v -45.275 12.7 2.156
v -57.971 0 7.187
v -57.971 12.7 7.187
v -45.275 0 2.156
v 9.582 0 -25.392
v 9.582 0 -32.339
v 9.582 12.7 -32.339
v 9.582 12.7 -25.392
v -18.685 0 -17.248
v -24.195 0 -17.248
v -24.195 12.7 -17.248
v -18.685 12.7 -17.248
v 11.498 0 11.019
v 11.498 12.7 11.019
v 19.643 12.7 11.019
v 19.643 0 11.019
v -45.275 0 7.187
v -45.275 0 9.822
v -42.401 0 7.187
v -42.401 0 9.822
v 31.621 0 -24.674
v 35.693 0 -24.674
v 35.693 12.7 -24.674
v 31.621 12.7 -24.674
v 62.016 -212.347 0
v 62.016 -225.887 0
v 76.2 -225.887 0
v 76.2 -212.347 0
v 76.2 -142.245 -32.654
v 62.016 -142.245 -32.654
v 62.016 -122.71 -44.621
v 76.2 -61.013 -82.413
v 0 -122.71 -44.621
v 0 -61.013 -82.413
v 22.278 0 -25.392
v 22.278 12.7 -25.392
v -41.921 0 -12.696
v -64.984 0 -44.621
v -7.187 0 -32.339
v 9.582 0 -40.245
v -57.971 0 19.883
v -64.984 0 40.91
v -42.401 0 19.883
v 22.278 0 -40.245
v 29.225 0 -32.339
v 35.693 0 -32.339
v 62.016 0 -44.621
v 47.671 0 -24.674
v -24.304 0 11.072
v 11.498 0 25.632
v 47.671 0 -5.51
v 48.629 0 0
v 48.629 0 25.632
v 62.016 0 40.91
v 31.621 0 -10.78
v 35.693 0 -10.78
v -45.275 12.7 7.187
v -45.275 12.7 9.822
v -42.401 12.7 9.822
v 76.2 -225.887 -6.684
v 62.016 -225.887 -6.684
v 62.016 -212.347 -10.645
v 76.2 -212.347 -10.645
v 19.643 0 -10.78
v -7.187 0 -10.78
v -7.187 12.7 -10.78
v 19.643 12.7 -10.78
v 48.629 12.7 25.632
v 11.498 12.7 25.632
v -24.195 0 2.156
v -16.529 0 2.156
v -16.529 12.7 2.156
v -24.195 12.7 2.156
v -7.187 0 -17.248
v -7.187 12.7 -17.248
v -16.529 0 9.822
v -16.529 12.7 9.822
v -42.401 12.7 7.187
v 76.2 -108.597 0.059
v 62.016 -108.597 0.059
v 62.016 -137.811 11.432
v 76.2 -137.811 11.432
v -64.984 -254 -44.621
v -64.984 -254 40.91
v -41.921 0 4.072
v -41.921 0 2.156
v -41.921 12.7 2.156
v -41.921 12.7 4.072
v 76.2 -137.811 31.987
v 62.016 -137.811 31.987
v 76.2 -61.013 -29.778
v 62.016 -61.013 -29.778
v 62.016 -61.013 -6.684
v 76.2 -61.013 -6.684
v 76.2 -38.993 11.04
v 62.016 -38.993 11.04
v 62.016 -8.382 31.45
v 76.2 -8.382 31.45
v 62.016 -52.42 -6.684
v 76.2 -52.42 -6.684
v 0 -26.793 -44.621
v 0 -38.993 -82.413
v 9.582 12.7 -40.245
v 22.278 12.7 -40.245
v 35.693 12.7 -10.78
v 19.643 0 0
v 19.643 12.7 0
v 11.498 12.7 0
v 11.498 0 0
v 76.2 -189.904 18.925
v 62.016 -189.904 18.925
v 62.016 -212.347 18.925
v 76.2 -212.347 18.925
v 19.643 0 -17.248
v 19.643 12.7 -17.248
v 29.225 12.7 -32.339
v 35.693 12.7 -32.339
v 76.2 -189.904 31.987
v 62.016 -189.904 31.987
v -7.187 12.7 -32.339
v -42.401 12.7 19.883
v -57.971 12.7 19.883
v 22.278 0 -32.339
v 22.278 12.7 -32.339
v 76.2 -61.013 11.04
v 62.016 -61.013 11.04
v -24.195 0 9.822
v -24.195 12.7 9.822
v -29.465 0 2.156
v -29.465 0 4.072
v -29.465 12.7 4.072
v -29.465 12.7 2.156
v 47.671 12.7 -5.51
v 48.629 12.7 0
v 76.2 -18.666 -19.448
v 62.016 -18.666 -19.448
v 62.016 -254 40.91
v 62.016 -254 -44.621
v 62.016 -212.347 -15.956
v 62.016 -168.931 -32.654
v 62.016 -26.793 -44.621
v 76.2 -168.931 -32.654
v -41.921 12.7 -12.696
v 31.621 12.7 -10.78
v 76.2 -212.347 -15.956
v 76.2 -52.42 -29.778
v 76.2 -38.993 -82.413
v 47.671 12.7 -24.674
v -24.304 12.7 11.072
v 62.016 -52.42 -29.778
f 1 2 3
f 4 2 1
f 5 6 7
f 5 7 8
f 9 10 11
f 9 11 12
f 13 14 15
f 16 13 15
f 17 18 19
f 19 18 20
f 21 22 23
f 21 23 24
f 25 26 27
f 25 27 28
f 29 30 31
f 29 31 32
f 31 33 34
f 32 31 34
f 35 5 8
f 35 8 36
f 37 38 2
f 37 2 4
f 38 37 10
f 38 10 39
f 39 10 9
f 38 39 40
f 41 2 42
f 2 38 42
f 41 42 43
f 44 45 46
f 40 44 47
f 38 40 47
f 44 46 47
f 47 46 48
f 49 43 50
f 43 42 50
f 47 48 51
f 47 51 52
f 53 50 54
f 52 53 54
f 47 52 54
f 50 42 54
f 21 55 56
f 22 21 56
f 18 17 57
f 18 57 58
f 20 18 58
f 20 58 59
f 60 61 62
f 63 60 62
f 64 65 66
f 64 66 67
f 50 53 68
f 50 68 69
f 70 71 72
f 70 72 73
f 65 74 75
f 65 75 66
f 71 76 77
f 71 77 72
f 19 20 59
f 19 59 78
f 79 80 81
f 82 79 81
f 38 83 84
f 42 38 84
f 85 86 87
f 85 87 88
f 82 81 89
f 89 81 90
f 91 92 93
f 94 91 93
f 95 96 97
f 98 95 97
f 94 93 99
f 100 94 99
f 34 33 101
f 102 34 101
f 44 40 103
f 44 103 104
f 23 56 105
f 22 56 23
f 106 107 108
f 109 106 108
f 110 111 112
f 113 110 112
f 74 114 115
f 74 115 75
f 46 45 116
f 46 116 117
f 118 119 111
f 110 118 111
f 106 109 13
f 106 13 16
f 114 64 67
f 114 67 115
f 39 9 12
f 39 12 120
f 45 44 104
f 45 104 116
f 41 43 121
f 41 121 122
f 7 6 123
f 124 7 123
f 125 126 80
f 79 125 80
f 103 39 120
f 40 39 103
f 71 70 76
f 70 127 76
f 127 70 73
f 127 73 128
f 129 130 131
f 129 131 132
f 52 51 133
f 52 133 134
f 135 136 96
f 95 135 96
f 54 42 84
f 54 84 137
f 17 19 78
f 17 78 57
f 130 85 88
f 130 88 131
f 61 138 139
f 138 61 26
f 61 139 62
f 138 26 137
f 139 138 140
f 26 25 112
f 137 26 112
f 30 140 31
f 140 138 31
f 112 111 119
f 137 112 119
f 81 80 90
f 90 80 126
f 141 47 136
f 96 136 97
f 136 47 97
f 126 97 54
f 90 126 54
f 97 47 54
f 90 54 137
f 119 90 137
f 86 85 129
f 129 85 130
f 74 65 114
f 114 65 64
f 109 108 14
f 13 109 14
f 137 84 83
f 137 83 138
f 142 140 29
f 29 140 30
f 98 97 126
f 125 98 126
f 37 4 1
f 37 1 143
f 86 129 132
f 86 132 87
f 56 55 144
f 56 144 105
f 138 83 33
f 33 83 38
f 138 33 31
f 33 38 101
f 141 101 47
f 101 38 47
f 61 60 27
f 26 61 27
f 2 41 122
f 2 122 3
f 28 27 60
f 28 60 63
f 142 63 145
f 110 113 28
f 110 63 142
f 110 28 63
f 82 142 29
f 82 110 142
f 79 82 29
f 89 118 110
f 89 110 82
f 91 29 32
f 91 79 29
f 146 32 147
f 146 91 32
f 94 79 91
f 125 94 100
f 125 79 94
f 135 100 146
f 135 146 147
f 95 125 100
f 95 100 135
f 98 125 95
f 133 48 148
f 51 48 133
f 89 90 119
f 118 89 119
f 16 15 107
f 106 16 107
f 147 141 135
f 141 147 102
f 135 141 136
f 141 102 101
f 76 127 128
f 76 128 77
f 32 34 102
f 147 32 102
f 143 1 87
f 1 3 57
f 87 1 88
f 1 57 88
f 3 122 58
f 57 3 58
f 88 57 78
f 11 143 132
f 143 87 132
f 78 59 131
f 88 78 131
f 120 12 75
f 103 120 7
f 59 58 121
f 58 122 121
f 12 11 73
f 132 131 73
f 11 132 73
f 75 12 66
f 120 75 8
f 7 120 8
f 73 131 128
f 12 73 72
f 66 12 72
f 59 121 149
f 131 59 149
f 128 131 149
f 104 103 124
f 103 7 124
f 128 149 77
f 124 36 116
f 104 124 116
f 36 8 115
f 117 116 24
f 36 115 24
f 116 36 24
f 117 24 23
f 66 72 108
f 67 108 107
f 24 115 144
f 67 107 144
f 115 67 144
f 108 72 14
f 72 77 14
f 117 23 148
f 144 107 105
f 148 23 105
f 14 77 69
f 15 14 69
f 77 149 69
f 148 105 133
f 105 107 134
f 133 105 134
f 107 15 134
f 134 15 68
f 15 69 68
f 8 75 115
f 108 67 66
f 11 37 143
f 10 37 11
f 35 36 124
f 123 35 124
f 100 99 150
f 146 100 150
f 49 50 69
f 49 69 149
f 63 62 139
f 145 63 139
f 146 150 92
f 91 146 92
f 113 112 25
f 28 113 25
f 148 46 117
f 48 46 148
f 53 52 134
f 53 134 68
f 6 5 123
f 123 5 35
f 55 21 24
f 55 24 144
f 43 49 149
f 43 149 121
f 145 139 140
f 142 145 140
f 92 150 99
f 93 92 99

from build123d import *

# Parameters (mm, degrees)
F0_W     = 127
F0_H     = 85.5306185286
F1_DEPTH = 254
F2_W     = 44.157743454
F2_H     = 12.9875717685
F3_DEPTH = 76.2
F4_W     = 12.6961972564
F4_H     = 7.905177772
F5_DEPTH = 12.7
F6_W     = 9.1298371553
F6_H     = 11.8159283884
F6_W_2   = 8.5927993059
F6_H_2   = 6.6836136393
F6_W_3   = 35.9823405743
F7_DEPTH = 76.2


with BuildPart() as f1:
    # F0 (on Front) → F1 (new body)
    with BuildSketch(Plane.XZ):
        with Locations((-1.4842953533, -1.855365932)):
            Rectangle(F0_W, F0_H)
    extrude(amount=F1_DEPTH)

    # F2 (on Right) → F3 (join)
    with BuildSketch(Plane.YZ):
        Polygon((-157.0569574833, 18.924748525), (-212.3468965292, 18.924748525), (-212.3468965292, -15.9561578184), (-168.9313054085, -15.9561578184), (-168.9313054085, 0), (-157.0569574833, 0), align=None)
        Polygon((-108.4463298321, 0), (-157.0569574833, 18.924748525), (-157.0569574833, 0), align=None)
        Polygon((-168.9313054085, -15.9561578184), (-212.3468965292, -15.9561578184), (-168.9313054085, -32.6544642448), align=None)
        Polygon((-108.4463298321, 0), (-157.0569574833, 0), (-157.0569574833, -15.9561578184), (-168.9313054085, -15.9561578184), (-168.9313054085, -32.6544642448), (-108.4463298321, -32.6544642448), (-108.4463298321, -21.8933336437), (-116.9810146093, -21.8933336437), (-116.9810146093, -8.9057618752), (-108.4463298321, -8.9057618752), align=None)
        Polygon((-64.2885863781, -8.9057618752), (-108.4463298321, 0), (-108.4463298321, -8.9057618752), align=None)
        with Locations((-86.3674581051, -15.3995477594)):
            Rectangle(F2_W, F2_H)
        Polygon((-108.4463298321, -21.8933336437), (-108.4463298321, -32.6544642448), (-64.2885863781, -21.8933336437), align=None)
    extrude(amount=F3_DEPTH)

    # F4 (on Front) → F5 (join)
    with BuildSketch(Plane.XZ):
        Polygon((-24.3036681507, 11.0724206409), (-24.1946410388, 11.0193416476), (11.4984409884, 11.0193416476), (11.4984409884, 25.6319474429), align=None)
        Polygon((11.4984409884, 11.0193416476), (-24.1946410388, 11.0193416476), (-24.1946410388, 9.8215872422), (-16.5290106088, 9.8215872422), (-16.5290106088, 2.1559579764), (-24.1946410388, 2.1559579764), (-24.1946410388, -17.2476638108), (-18.684970215, -17.2476638108), (-7.1865268983, -17.2476638108), (-7.1865268983, -10.779789649), (19.6431726217, -10.779789649), (19.6431726217, 0), (11.4984409884, 0), align=None)
        Polygon((-24.1946410388, 9.8215872422), (-24.1946410388, 11.0193416476), (-24.3036681507, 11.0724206409), (-42.400509119, 19.8827255517), (-42.400509119, 9.8215872422), align=None)
        Polygon((11.4984409884, 25.6319474429), (11.4984409884, 11.0193416476), (19.6431726217, 11.0193416476), (19.6431726217, 0), (48.6288368702, 0), (48.6288368702, 25.6319474429), align=None)
        Polygon((-24.1946410388, 2.1559579764), (-24.1946410388, 9.8215872422), (-42.400509119, 9.8215872422), (-42.400509119, 7.186527364), (-45.2751219273, 7.186527364), (-45.2751219273, 2.1559579764), (-41.9214069843, 2.1559579764), (-41.9214069843, 4.072365351), (-29.4647607952, 4.072365351), (-29.4647607952, 2.1559579764), align=None)
        Polygon((-24.1946410388, -17.2476638108), (-24.1946410388, 2.1559579764), (-29.4647607952, 2.1559579764), (-29.4647607952, -4.3119159527), align=None)
        Polygon((-45.2751219273, 9.8215872422), (-42.400509119, 9.8215872422), (-42.400509119, 19.8827255517), (-57.9713173211, 19.8827255517), (-57.9713173211, 7.186527364), (-45.2751219273, 7.186527364), align=None)
        Polygon((48.6288368702, 0), (19.6431726217, 0), (19.6431726217, -10.779789649), (31.6207185388, -10.779789649), (31.6207185388, -5.5096708238), (47.6706326008, -5.5096708238), align=None)
        Polygon((-41.9214069843, -12.6961972564), (-24.1946410388, -17.2476638108), (-29.4647607952, -4.3119159527), (-29.4647607952, -12.6961972564), align=None)
        Polygon((-29.4647607952, -4.3119159527), (-29.4647607952, 2.1559579764), (-41.9214069843, 2.1559579764), (-41.9214069843, -12.6961972564), (-29.4647607952, -12.6961972564), align=None)
        Polygon((31.6207185388, -10.779789649), (19.6431726217, -10.779789649), (19.6431726217, -17.2476638108), (-7.1865268983, -17.2476638108), (-7.1865268983, -32.3393717408), (9.5820333809, -32.3393717408), (9.5820333809, -25.3923945129), (22.2782306373, -25.3923945129), (22.2782306373, -32.3393717408), (29.2252078652, -32.3393717408), (35.6930866838, -32.3393717408), (35.6930866838, -24.6737431735), (31.6207185388, -24.6737431735), align=None)
        Polygon((-7.1865268983, -17.2476638108), (-18.684970215, -17.2476638108), (-7.1865268983, -32.3393717408), align=None)
        Polygon((-45.2751219273, 2.1559579764), (-41.9214069843, -12.6961972564), (-41.9214069843, 2.1559579764), align=None)
        Polygon((-45.2751219273, 2.1559579764), (-45.2751219273, 7.186527364), (-57.9713173211, 7.186527364), align=None)
        Polygon((31.6207185388, -5.5096708238), (31.6207185388, -10.779789649), (35.6930866838, -10.779789649), (35.6930866838, -24.6737431735), (47.6706326008, -24.6737431735), (47.6706326008, -5.5096708238), align=None)
        Polygon((9.5820333809, -32.3393717408), (-7.1865268983, -32.3393717408), (9.5820333809, -40.2445495129), align=None)
        Polygon((35.6930866838, -32.3393717408), (47.6706326008, -24.6737431735), (35.6930866838, -24.6737431735), align=None)
        with Locations((15.9301320091, -36.2919606268)):
            Rectangle(F4_W, F4_H)
        Polygon((29.2252078652, -32.3393717408), (22.2782306373, -32.3393717408), (22.2782306373, -40.2445495129), align=None)
    extrude(amount=-F5_DEPTH)

    # F6 (on Right) → F7 (join)
    with BuildSketch(Plane.YZ):
        Polygon((-38.9934703708, -82.4129879475), (-38.9934703708, 11.0402805731), (-61.0125139356, 11.0402805731), (-61.0125139356, -6.6836136393), (-52.4197183549, -6.6836136393), (-52.4197183549, -29.7783855349), (-61.0125139356, -29.7783855349), (-61.0125139356, -82.4129879475), align=None)
        Polygon((-18.666213934, -19.4484525669), (-38.9934703708, 11.0402805731), (-38.9934703708, -82.4129879475), align=None)
        Polygon((-61.0125139356, 11.0402805731), (-38.9934703708, 11.0402805731), (-8.3816275001, 31.4496159554), align=None)
        Polygon((-61.0125139356, -6.6836136393), (-61.0125139356, 11.0402805731), (-137.8106474876, -6.6836136393), align=None)
        Polygon((-61.0125139356, -29.7783855349), (-61.0125139356, -6.6836136393), (-137.8106474876, -6.6836136393), (-137.8106474876, -18.4995420277), (-146.940484643, -18.4995420277), (-146.940484643, -29.7783855349), align=None)
        with Locations((-142.3755660653, -12.5915778335)):
            Rectangle(F6_W, F6_H)
        Polygon((-146.940484643, -6.6836136393), (-137.8106474876, -6.6836136393), (-137.8106474876, 31.9867022336), (-189.9044811726, 31.9867022336), (-189.9044811726, 0), (-181.3116818666, 0), (-181.3116818666, -6.6836136393), (-189.9044811726, -6.6836136393), (-189.9044811726, -17.2098011525), (-185.4956773803, -18.4995420277), (-146.940484643, -18.4995420277), align=None)
        Polygon((-146.940484643, -29.7783855349), (-61.0125139356, -82.4129879475), (-61.0125139356, -29.7783855349), align=None)
        Polygon((-185.4956773803, -18.4995420277), (-146.940484643, -29.7783855349), (-146.940484643, -18.4995420277), align=None)
        Polygon((-189.9044811726, -18.4995420277), (-185.4956773803, -18.4995420277), (-189.9044811726, -17.2098011525), align=None)
        with Locations((-185.6080815196, -3.3418068197)):
            Rectangle(F6_W_2, F6_H_2)
        with Locations((-207.8956514597, -3.3418068197)):
            Rectangle(F6_W_3, F6_H_2)
        Polygon((-225.8868217468, -6.6836136393), (-189.9044811726, -17.2098011525), (-189.9044811726, -6.6836136393), align=None)
    extrude(amount=F7_DEPTH)


solid = f1.part
